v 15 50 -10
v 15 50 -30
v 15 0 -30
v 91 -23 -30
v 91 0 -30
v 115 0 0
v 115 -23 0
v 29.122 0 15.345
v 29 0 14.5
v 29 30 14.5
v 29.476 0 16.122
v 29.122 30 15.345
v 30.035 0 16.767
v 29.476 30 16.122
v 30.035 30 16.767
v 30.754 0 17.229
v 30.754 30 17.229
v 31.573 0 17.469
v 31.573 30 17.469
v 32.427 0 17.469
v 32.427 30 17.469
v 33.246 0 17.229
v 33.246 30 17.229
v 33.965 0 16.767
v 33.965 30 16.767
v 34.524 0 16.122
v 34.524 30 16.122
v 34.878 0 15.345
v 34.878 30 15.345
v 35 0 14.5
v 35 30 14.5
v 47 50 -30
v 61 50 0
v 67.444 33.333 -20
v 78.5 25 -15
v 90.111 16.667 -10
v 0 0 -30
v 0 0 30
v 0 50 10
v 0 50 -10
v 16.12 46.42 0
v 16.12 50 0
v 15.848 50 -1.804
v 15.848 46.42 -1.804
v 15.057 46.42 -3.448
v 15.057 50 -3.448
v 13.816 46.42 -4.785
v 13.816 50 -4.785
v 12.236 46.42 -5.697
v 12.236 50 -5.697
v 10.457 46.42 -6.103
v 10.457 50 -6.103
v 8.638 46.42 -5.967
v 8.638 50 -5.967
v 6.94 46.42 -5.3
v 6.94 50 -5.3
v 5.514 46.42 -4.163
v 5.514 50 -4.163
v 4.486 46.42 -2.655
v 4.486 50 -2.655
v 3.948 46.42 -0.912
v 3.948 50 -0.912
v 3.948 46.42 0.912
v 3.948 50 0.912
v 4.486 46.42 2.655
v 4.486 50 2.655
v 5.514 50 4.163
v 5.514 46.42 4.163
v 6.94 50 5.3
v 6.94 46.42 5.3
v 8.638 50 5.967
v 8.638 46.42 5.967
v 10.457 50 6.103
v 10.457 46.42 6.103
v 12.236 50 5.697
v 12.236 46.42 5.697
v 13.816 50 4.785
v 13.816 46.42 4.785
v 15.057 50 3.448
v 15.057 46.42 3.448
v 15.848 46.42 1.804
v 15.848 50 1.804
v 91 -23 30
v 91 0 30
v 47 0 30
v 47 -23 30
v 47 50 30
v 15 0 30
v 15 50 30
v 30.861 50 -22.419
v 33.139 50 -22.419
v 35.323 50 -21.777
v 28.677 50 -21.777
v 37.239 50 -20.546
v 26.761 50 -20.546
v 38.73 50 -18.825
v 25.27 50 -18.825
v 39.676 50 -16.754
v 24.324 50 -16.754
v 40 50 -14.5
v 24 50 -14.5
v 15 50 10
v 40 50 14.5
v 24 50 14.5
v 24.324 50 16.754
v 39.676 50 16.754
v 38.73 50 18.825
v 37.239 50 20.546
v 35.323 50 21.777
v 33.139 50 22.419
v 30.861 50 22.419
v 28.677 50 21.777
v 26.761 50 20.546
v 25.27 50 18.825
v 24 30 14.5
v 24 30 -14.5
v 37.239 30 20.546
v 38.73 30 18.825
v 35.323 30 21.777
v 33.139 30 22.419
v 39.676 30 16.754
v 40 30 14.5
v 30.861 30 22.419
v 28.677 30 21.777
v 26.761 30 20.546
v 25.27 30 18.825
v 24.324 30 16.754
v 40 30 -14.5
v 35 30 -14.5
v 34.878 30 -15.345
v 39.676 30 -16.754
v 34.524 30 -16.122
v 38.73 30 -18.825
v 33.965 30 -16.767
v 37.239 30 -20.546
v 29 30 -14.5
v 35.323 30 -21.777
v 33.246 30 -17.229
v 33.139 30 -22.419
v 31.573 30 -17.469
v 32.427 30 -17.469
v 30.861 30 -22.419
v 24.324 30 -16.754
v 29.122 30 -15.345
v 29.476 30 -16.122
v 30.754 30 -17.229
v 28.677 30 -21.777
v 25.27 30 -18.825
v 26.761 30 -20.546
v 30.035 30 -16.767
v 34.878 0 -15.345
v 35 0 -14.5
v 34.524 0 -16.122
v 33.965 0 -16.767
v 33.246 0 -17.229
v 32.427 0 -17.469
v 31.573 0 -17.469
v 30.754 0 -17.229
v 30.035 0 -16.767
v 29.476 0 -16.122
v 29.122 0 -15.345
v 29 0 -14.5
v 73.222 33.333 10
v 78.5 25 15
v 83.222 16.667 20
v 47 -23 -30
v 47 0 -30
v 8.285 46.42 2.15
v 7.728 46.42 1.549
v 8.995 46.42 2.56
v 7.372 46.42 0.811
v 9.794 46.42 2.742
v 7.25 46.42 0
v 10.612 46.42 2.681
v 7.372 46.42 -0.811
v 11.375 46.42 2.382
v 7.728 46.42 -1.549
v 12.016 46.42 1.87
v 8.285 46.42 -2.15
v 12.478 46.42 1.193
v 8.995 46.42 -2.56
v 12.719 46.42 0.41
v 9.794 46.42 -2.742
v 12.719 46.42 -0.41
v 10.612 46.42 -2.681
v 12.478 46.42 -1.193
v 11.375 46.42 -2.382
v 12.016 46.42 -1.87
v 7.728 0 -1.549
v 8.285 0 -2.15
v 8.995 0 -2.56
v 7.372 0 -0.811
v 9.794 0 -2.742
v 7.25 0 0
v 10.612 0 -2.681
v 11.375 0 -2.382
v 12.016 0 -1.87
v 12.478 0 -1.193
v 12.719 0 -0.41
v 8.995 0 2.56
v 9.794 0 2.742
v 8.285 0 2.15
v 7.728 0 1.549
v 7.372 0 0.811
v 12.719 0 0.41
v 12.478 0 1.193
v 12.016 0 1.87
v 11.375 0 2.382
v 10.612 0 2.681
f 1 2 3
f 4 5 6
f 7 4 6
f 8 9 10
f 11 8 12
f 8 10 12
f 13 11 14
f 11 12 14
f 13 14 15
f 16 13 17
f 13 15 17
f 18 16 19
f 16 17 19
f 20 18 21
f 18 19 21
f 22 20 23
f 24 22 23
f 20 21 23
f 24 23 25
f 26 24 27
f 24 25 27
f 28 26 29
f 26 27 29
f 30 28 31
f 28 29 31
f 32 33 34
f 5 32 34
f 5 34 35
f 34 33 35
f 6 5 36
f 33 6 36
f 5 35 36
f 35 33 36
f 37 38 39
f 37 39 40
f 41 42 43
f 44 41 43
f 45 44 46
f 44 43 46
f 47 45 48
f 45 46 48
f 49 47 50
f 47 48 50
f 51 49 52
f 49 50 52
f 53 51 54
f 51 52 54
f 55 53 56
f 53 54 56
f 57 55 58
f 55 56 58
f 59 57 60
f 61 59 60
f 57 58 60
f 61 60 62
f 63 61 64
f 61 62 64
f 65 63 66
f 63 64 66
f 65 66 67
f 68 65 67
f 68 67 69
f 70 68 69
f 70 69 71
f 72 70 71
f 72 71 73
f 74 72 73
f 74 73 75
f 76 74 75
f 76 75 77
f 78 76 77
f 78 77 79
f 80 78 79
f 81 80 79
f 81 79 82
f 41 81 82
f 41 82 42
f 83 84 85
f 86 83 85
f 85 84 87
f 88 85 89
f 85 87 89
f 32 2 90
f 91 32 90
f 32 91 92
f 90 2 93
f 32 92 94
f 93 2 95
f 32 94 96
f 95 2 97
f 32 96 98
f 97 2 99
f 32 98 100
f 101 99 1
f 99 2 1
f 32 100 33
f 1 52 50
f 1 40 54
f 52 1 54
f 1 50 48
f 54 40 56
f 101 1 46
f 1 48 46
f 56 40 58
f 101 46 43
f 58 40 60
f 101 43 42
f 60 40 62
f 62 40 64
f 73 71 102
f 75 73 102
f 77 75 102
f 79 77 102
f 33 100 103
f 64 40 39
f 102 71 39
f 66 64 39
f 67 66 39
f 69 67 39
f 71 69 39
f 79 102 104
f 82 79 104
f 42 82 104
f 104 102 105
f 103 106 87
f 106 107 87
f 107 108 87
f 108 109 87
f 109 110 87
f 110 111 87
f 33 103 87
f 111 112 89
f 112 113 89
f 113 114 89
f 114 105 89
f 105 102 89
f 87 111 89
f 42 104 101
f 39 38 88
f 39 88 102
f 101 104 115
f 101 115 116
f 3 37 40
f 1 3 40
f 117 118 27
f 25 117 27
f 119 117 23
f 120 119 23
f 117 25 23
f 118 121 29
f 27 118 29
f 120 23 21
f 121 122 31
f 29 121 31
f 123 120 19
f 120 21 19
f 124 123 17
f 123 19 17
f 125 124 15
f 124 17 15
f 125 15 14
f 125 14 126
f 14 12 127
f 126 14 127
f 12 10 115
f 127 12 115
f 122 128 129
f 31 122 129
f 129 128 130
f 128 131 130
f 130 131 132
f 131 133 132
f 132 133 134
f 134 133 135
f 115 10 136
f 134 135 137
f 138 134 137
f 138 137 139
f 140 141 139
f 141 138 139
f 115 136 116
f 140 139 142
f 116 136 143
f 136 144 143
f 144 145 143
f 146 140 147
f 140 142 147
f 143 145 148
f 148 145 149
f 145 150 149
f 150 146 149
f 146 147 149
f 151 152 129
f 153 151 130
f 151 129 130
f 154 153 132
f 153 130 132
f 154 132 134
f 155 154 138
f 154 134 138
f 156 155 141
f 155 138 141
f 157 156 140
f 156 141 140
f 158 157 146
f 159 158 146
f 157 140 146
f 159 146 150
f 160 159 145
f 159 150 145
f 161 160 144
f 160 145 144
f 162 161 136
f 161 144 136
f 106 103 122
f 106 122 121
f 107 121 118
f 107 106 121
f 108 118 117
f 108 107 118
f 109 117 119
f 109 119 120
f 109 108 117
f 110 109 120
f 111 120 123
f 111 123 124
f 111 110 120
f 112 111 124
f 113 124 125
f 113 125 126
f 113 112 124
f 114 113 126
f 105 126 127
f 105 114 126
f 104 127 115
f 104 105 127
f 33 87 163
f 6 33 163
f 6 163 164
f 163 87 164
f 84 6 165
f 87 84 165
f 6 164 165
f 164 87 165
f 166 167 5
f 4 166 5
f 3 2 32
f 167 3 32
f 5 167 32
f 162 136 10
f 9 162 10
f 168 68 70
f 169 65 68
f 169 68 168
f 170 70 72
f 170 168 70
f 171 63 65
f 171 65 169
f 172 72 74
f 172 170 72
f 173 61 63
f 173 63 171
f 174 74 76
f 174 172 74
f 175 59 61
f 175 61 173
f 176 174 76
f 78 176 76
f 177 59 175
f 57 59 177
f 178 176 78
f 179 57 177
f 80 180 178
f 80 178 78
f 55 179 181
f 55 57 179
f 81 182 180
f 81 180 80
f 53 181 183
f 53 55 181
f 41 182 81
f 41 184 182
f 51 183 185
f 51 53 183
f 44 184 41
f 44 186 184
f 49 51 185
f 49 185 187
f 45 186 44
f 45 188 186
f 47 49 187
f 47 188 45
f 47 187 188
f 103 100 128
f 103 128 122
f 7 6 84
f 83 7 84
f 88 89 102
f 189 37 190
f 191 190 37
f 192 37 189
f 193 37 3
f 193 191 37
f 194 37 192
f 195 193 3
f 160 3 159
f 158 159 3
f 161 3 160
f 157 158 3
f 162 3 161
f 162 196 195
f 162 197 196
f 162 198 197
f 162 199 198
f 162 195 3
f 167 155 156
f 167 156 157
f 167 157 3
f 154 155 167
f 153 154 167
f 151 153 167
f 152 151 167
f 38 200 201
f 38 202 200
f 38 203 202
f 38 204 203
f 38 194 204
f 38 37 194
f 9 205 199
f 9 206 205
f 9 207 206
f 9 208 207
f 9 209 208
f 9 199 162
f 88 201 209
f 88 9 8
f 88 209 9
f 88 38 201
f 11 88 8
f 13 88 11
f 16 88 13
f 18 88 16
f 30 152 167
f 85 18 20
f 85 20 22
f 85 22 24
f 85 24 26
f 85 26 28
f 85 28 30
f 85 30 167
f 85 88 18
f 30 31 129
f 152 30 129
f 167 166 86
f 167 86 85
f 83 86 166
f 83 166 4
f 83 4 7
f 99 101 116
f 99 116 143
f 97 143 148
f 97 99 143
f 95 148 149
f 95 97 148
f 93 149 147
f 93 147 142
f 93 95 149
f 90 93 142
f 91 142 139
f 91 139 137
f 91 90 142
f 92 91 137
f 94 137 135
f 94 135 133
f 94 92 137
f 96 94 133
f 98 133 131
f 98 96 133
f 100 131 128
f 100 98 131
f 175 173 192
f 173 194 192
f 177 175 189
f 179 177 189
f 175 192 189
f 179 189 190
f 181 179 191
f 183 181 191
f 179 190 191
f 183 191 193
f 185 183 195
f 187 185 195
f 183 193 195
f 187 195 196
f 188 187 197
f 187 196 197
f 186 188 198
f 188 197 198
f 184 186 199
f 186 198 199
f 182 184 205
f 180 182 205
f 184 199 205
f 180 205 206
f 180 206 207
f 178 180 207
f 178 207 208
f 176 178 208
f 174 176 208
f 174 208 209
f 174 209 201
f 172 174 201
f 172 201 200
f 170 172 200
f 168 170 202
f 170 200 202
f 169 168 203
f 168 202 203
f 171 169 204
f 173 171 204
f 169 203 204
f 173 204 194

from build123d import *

# Parameters (mm, degrees)
BOSS_EXTRUDE2_DEPTH                     = 23
SKETCH17_W                              = 47
SKETCH17_H                              = 23
CUT_EXTRUDE5_DEPTH                      = 140.014387906
CUT_EXTRUDE6_DEPTH                      = 15
CUT_EXTRUDE7_DEPTH                      = 20
CUT_EXTRUDE8_DEPTH                      = 140.477596924
CBORE_FOR_M5_HEX_HEAD_BOLT2_D           = 5.5
CBORE_FOR_M5_HEX_HEAD_BOLT2_CBORE_D     = 12.24
CBORE_FOR_M5_HEX_HEAD_BOLT2_CBORE_DEPTH = 3.58


with BuildPart() as part:
    # Sketch15 → Loft2 section 0
    with BuildSketch(Plane(origin=(0, 50, 0), x_dir=(1, 0, 0), z_dir=(0, 1, 0))):
        with BuildLine():
            Line((0, 30), (0, -30))
            Line((0, -30), (47, -30))
            Line((47, -30), (61, 0))
            Line((61, 0), (47, 30))
            Line((47, 30), (0, 30))
        make_face()
    # Sketch1 → Loft2 section 1
    with BuildSketch(Plane(origin=(0, 0, 0), x_dir=(1, 0, 0), z_dir=(0, 1, 0))):
        with BuildLine():
            Line((0, -30), (0, 30))
            Line((0, 30), (91, 30))
            Line((91, 30), (115, 0))
            Line((115, 0), (91, -30))
            Line((91, -30), (0, -30))
        make_face()
    loft()

    # Sketch16 → Boss-Extrude2 (add)
    with BuildSketch(Plane.XZ):
        Polygon((91, 30), (0, 30), (0, -30), (91, -30), (115, 0), align=None)
    extrude(amount=BOSS_EXTRUDE2_DEPTH)

    # Sketch17 → Cut-Extrude5 (cut, through all)
    with BuildSketch(Plane.XY.offset(30)):
        with Locations((23.5, -11.5)):
            Rectangle(SKETCH17_W, SKETCH17_H)
    extrude(amount=-CUT_EXTRUDE5_DEPTH, mode=Mode.SUBTRACT)

    # Sketch19 → Cut-Extrude6 (cut)
    with BuildSketch(Plane.ZY):
        Polygon((10, 50), (30, 50), (30, 0), align=None)
        Polygon((-10, 50), (-30, 50), (-30, 0), align=None)
    extrude(amount=-CUT_EXTRUDE6_DEPTH, mode=Mode.SUBTRACT)

    # Sketch20 → Cut-Extrude7 (cut)
    with BuildSketch(Plane(origin=(0, 50, 0), x_dir=(1, 0, 0), z_dir=(0, 1, 0))):
        with BuildLine():
            Line((40, 14.5), (40, -14.5))
            ThreePointArc((40, -14.5), (32, -22.5), (24, -14.5))
            Line((24, -14.5), (24, 14.5))
            ThreePointArc((24, 14.5), (32, 22.5), (40, 14.5))
        make_face()
        with BuildLine():
            Line((35, 14.5), (35, -14.5))
            ThreePointArc((35, -14.5), (32, -17.5), (29, -14.5))
            Line((29, -14.5), (29, 14.5))
            ThreePointArc((29, 14.5), (32, 17.5), (35, 14.5))
        make_face(mode=Mode.SUBTRACT)
    extrude(amount=-CUT_EXTRUDE7_DEPTH, mode=Mode.SUBTRACT)

    # Sketch20<2> → Cut-Extrude8 (cut, through all)
    with BuildSketch(Plane(origin=(0, 50, 0), x_dir=(1, 0, 0), z_dir=(0, 1, 0))):
        with BuildLine():
            Line((35, -14.5), (35, 14.5))
            ThreePointArc((35, 14.5), (32, 17.5), (29, 14.5))
            Line((29, 14.5), (29, -14.5))
            ThreePointArc((29, -14.5), (32, -17.5), (35, -14.5))
        make_face()
    extrude(amount=-CUT_EXTRUDE8_DEPTH, mode=Mode.SUBTRACT)

    # CBORE for M5 Hex Head Bolt2 (through all)
    with Locations(Plane(origin=(0, 50, 0), x_dir=(1, 0, 0), z_dir=(0, 1, 0))):
        with Locations((10, 0)):
            CounterBoreHole(CBORE_FOR_M5_HEX_HEAD_BOLT2_D / 2, CBORE_FOR_M5_HEX_HEAD_BOLT2_CBORE_D / 2, CBORE_FOR_M5_HEX_HEAD_BOLT2_CBORE_DEPTH)


solid = part.part
